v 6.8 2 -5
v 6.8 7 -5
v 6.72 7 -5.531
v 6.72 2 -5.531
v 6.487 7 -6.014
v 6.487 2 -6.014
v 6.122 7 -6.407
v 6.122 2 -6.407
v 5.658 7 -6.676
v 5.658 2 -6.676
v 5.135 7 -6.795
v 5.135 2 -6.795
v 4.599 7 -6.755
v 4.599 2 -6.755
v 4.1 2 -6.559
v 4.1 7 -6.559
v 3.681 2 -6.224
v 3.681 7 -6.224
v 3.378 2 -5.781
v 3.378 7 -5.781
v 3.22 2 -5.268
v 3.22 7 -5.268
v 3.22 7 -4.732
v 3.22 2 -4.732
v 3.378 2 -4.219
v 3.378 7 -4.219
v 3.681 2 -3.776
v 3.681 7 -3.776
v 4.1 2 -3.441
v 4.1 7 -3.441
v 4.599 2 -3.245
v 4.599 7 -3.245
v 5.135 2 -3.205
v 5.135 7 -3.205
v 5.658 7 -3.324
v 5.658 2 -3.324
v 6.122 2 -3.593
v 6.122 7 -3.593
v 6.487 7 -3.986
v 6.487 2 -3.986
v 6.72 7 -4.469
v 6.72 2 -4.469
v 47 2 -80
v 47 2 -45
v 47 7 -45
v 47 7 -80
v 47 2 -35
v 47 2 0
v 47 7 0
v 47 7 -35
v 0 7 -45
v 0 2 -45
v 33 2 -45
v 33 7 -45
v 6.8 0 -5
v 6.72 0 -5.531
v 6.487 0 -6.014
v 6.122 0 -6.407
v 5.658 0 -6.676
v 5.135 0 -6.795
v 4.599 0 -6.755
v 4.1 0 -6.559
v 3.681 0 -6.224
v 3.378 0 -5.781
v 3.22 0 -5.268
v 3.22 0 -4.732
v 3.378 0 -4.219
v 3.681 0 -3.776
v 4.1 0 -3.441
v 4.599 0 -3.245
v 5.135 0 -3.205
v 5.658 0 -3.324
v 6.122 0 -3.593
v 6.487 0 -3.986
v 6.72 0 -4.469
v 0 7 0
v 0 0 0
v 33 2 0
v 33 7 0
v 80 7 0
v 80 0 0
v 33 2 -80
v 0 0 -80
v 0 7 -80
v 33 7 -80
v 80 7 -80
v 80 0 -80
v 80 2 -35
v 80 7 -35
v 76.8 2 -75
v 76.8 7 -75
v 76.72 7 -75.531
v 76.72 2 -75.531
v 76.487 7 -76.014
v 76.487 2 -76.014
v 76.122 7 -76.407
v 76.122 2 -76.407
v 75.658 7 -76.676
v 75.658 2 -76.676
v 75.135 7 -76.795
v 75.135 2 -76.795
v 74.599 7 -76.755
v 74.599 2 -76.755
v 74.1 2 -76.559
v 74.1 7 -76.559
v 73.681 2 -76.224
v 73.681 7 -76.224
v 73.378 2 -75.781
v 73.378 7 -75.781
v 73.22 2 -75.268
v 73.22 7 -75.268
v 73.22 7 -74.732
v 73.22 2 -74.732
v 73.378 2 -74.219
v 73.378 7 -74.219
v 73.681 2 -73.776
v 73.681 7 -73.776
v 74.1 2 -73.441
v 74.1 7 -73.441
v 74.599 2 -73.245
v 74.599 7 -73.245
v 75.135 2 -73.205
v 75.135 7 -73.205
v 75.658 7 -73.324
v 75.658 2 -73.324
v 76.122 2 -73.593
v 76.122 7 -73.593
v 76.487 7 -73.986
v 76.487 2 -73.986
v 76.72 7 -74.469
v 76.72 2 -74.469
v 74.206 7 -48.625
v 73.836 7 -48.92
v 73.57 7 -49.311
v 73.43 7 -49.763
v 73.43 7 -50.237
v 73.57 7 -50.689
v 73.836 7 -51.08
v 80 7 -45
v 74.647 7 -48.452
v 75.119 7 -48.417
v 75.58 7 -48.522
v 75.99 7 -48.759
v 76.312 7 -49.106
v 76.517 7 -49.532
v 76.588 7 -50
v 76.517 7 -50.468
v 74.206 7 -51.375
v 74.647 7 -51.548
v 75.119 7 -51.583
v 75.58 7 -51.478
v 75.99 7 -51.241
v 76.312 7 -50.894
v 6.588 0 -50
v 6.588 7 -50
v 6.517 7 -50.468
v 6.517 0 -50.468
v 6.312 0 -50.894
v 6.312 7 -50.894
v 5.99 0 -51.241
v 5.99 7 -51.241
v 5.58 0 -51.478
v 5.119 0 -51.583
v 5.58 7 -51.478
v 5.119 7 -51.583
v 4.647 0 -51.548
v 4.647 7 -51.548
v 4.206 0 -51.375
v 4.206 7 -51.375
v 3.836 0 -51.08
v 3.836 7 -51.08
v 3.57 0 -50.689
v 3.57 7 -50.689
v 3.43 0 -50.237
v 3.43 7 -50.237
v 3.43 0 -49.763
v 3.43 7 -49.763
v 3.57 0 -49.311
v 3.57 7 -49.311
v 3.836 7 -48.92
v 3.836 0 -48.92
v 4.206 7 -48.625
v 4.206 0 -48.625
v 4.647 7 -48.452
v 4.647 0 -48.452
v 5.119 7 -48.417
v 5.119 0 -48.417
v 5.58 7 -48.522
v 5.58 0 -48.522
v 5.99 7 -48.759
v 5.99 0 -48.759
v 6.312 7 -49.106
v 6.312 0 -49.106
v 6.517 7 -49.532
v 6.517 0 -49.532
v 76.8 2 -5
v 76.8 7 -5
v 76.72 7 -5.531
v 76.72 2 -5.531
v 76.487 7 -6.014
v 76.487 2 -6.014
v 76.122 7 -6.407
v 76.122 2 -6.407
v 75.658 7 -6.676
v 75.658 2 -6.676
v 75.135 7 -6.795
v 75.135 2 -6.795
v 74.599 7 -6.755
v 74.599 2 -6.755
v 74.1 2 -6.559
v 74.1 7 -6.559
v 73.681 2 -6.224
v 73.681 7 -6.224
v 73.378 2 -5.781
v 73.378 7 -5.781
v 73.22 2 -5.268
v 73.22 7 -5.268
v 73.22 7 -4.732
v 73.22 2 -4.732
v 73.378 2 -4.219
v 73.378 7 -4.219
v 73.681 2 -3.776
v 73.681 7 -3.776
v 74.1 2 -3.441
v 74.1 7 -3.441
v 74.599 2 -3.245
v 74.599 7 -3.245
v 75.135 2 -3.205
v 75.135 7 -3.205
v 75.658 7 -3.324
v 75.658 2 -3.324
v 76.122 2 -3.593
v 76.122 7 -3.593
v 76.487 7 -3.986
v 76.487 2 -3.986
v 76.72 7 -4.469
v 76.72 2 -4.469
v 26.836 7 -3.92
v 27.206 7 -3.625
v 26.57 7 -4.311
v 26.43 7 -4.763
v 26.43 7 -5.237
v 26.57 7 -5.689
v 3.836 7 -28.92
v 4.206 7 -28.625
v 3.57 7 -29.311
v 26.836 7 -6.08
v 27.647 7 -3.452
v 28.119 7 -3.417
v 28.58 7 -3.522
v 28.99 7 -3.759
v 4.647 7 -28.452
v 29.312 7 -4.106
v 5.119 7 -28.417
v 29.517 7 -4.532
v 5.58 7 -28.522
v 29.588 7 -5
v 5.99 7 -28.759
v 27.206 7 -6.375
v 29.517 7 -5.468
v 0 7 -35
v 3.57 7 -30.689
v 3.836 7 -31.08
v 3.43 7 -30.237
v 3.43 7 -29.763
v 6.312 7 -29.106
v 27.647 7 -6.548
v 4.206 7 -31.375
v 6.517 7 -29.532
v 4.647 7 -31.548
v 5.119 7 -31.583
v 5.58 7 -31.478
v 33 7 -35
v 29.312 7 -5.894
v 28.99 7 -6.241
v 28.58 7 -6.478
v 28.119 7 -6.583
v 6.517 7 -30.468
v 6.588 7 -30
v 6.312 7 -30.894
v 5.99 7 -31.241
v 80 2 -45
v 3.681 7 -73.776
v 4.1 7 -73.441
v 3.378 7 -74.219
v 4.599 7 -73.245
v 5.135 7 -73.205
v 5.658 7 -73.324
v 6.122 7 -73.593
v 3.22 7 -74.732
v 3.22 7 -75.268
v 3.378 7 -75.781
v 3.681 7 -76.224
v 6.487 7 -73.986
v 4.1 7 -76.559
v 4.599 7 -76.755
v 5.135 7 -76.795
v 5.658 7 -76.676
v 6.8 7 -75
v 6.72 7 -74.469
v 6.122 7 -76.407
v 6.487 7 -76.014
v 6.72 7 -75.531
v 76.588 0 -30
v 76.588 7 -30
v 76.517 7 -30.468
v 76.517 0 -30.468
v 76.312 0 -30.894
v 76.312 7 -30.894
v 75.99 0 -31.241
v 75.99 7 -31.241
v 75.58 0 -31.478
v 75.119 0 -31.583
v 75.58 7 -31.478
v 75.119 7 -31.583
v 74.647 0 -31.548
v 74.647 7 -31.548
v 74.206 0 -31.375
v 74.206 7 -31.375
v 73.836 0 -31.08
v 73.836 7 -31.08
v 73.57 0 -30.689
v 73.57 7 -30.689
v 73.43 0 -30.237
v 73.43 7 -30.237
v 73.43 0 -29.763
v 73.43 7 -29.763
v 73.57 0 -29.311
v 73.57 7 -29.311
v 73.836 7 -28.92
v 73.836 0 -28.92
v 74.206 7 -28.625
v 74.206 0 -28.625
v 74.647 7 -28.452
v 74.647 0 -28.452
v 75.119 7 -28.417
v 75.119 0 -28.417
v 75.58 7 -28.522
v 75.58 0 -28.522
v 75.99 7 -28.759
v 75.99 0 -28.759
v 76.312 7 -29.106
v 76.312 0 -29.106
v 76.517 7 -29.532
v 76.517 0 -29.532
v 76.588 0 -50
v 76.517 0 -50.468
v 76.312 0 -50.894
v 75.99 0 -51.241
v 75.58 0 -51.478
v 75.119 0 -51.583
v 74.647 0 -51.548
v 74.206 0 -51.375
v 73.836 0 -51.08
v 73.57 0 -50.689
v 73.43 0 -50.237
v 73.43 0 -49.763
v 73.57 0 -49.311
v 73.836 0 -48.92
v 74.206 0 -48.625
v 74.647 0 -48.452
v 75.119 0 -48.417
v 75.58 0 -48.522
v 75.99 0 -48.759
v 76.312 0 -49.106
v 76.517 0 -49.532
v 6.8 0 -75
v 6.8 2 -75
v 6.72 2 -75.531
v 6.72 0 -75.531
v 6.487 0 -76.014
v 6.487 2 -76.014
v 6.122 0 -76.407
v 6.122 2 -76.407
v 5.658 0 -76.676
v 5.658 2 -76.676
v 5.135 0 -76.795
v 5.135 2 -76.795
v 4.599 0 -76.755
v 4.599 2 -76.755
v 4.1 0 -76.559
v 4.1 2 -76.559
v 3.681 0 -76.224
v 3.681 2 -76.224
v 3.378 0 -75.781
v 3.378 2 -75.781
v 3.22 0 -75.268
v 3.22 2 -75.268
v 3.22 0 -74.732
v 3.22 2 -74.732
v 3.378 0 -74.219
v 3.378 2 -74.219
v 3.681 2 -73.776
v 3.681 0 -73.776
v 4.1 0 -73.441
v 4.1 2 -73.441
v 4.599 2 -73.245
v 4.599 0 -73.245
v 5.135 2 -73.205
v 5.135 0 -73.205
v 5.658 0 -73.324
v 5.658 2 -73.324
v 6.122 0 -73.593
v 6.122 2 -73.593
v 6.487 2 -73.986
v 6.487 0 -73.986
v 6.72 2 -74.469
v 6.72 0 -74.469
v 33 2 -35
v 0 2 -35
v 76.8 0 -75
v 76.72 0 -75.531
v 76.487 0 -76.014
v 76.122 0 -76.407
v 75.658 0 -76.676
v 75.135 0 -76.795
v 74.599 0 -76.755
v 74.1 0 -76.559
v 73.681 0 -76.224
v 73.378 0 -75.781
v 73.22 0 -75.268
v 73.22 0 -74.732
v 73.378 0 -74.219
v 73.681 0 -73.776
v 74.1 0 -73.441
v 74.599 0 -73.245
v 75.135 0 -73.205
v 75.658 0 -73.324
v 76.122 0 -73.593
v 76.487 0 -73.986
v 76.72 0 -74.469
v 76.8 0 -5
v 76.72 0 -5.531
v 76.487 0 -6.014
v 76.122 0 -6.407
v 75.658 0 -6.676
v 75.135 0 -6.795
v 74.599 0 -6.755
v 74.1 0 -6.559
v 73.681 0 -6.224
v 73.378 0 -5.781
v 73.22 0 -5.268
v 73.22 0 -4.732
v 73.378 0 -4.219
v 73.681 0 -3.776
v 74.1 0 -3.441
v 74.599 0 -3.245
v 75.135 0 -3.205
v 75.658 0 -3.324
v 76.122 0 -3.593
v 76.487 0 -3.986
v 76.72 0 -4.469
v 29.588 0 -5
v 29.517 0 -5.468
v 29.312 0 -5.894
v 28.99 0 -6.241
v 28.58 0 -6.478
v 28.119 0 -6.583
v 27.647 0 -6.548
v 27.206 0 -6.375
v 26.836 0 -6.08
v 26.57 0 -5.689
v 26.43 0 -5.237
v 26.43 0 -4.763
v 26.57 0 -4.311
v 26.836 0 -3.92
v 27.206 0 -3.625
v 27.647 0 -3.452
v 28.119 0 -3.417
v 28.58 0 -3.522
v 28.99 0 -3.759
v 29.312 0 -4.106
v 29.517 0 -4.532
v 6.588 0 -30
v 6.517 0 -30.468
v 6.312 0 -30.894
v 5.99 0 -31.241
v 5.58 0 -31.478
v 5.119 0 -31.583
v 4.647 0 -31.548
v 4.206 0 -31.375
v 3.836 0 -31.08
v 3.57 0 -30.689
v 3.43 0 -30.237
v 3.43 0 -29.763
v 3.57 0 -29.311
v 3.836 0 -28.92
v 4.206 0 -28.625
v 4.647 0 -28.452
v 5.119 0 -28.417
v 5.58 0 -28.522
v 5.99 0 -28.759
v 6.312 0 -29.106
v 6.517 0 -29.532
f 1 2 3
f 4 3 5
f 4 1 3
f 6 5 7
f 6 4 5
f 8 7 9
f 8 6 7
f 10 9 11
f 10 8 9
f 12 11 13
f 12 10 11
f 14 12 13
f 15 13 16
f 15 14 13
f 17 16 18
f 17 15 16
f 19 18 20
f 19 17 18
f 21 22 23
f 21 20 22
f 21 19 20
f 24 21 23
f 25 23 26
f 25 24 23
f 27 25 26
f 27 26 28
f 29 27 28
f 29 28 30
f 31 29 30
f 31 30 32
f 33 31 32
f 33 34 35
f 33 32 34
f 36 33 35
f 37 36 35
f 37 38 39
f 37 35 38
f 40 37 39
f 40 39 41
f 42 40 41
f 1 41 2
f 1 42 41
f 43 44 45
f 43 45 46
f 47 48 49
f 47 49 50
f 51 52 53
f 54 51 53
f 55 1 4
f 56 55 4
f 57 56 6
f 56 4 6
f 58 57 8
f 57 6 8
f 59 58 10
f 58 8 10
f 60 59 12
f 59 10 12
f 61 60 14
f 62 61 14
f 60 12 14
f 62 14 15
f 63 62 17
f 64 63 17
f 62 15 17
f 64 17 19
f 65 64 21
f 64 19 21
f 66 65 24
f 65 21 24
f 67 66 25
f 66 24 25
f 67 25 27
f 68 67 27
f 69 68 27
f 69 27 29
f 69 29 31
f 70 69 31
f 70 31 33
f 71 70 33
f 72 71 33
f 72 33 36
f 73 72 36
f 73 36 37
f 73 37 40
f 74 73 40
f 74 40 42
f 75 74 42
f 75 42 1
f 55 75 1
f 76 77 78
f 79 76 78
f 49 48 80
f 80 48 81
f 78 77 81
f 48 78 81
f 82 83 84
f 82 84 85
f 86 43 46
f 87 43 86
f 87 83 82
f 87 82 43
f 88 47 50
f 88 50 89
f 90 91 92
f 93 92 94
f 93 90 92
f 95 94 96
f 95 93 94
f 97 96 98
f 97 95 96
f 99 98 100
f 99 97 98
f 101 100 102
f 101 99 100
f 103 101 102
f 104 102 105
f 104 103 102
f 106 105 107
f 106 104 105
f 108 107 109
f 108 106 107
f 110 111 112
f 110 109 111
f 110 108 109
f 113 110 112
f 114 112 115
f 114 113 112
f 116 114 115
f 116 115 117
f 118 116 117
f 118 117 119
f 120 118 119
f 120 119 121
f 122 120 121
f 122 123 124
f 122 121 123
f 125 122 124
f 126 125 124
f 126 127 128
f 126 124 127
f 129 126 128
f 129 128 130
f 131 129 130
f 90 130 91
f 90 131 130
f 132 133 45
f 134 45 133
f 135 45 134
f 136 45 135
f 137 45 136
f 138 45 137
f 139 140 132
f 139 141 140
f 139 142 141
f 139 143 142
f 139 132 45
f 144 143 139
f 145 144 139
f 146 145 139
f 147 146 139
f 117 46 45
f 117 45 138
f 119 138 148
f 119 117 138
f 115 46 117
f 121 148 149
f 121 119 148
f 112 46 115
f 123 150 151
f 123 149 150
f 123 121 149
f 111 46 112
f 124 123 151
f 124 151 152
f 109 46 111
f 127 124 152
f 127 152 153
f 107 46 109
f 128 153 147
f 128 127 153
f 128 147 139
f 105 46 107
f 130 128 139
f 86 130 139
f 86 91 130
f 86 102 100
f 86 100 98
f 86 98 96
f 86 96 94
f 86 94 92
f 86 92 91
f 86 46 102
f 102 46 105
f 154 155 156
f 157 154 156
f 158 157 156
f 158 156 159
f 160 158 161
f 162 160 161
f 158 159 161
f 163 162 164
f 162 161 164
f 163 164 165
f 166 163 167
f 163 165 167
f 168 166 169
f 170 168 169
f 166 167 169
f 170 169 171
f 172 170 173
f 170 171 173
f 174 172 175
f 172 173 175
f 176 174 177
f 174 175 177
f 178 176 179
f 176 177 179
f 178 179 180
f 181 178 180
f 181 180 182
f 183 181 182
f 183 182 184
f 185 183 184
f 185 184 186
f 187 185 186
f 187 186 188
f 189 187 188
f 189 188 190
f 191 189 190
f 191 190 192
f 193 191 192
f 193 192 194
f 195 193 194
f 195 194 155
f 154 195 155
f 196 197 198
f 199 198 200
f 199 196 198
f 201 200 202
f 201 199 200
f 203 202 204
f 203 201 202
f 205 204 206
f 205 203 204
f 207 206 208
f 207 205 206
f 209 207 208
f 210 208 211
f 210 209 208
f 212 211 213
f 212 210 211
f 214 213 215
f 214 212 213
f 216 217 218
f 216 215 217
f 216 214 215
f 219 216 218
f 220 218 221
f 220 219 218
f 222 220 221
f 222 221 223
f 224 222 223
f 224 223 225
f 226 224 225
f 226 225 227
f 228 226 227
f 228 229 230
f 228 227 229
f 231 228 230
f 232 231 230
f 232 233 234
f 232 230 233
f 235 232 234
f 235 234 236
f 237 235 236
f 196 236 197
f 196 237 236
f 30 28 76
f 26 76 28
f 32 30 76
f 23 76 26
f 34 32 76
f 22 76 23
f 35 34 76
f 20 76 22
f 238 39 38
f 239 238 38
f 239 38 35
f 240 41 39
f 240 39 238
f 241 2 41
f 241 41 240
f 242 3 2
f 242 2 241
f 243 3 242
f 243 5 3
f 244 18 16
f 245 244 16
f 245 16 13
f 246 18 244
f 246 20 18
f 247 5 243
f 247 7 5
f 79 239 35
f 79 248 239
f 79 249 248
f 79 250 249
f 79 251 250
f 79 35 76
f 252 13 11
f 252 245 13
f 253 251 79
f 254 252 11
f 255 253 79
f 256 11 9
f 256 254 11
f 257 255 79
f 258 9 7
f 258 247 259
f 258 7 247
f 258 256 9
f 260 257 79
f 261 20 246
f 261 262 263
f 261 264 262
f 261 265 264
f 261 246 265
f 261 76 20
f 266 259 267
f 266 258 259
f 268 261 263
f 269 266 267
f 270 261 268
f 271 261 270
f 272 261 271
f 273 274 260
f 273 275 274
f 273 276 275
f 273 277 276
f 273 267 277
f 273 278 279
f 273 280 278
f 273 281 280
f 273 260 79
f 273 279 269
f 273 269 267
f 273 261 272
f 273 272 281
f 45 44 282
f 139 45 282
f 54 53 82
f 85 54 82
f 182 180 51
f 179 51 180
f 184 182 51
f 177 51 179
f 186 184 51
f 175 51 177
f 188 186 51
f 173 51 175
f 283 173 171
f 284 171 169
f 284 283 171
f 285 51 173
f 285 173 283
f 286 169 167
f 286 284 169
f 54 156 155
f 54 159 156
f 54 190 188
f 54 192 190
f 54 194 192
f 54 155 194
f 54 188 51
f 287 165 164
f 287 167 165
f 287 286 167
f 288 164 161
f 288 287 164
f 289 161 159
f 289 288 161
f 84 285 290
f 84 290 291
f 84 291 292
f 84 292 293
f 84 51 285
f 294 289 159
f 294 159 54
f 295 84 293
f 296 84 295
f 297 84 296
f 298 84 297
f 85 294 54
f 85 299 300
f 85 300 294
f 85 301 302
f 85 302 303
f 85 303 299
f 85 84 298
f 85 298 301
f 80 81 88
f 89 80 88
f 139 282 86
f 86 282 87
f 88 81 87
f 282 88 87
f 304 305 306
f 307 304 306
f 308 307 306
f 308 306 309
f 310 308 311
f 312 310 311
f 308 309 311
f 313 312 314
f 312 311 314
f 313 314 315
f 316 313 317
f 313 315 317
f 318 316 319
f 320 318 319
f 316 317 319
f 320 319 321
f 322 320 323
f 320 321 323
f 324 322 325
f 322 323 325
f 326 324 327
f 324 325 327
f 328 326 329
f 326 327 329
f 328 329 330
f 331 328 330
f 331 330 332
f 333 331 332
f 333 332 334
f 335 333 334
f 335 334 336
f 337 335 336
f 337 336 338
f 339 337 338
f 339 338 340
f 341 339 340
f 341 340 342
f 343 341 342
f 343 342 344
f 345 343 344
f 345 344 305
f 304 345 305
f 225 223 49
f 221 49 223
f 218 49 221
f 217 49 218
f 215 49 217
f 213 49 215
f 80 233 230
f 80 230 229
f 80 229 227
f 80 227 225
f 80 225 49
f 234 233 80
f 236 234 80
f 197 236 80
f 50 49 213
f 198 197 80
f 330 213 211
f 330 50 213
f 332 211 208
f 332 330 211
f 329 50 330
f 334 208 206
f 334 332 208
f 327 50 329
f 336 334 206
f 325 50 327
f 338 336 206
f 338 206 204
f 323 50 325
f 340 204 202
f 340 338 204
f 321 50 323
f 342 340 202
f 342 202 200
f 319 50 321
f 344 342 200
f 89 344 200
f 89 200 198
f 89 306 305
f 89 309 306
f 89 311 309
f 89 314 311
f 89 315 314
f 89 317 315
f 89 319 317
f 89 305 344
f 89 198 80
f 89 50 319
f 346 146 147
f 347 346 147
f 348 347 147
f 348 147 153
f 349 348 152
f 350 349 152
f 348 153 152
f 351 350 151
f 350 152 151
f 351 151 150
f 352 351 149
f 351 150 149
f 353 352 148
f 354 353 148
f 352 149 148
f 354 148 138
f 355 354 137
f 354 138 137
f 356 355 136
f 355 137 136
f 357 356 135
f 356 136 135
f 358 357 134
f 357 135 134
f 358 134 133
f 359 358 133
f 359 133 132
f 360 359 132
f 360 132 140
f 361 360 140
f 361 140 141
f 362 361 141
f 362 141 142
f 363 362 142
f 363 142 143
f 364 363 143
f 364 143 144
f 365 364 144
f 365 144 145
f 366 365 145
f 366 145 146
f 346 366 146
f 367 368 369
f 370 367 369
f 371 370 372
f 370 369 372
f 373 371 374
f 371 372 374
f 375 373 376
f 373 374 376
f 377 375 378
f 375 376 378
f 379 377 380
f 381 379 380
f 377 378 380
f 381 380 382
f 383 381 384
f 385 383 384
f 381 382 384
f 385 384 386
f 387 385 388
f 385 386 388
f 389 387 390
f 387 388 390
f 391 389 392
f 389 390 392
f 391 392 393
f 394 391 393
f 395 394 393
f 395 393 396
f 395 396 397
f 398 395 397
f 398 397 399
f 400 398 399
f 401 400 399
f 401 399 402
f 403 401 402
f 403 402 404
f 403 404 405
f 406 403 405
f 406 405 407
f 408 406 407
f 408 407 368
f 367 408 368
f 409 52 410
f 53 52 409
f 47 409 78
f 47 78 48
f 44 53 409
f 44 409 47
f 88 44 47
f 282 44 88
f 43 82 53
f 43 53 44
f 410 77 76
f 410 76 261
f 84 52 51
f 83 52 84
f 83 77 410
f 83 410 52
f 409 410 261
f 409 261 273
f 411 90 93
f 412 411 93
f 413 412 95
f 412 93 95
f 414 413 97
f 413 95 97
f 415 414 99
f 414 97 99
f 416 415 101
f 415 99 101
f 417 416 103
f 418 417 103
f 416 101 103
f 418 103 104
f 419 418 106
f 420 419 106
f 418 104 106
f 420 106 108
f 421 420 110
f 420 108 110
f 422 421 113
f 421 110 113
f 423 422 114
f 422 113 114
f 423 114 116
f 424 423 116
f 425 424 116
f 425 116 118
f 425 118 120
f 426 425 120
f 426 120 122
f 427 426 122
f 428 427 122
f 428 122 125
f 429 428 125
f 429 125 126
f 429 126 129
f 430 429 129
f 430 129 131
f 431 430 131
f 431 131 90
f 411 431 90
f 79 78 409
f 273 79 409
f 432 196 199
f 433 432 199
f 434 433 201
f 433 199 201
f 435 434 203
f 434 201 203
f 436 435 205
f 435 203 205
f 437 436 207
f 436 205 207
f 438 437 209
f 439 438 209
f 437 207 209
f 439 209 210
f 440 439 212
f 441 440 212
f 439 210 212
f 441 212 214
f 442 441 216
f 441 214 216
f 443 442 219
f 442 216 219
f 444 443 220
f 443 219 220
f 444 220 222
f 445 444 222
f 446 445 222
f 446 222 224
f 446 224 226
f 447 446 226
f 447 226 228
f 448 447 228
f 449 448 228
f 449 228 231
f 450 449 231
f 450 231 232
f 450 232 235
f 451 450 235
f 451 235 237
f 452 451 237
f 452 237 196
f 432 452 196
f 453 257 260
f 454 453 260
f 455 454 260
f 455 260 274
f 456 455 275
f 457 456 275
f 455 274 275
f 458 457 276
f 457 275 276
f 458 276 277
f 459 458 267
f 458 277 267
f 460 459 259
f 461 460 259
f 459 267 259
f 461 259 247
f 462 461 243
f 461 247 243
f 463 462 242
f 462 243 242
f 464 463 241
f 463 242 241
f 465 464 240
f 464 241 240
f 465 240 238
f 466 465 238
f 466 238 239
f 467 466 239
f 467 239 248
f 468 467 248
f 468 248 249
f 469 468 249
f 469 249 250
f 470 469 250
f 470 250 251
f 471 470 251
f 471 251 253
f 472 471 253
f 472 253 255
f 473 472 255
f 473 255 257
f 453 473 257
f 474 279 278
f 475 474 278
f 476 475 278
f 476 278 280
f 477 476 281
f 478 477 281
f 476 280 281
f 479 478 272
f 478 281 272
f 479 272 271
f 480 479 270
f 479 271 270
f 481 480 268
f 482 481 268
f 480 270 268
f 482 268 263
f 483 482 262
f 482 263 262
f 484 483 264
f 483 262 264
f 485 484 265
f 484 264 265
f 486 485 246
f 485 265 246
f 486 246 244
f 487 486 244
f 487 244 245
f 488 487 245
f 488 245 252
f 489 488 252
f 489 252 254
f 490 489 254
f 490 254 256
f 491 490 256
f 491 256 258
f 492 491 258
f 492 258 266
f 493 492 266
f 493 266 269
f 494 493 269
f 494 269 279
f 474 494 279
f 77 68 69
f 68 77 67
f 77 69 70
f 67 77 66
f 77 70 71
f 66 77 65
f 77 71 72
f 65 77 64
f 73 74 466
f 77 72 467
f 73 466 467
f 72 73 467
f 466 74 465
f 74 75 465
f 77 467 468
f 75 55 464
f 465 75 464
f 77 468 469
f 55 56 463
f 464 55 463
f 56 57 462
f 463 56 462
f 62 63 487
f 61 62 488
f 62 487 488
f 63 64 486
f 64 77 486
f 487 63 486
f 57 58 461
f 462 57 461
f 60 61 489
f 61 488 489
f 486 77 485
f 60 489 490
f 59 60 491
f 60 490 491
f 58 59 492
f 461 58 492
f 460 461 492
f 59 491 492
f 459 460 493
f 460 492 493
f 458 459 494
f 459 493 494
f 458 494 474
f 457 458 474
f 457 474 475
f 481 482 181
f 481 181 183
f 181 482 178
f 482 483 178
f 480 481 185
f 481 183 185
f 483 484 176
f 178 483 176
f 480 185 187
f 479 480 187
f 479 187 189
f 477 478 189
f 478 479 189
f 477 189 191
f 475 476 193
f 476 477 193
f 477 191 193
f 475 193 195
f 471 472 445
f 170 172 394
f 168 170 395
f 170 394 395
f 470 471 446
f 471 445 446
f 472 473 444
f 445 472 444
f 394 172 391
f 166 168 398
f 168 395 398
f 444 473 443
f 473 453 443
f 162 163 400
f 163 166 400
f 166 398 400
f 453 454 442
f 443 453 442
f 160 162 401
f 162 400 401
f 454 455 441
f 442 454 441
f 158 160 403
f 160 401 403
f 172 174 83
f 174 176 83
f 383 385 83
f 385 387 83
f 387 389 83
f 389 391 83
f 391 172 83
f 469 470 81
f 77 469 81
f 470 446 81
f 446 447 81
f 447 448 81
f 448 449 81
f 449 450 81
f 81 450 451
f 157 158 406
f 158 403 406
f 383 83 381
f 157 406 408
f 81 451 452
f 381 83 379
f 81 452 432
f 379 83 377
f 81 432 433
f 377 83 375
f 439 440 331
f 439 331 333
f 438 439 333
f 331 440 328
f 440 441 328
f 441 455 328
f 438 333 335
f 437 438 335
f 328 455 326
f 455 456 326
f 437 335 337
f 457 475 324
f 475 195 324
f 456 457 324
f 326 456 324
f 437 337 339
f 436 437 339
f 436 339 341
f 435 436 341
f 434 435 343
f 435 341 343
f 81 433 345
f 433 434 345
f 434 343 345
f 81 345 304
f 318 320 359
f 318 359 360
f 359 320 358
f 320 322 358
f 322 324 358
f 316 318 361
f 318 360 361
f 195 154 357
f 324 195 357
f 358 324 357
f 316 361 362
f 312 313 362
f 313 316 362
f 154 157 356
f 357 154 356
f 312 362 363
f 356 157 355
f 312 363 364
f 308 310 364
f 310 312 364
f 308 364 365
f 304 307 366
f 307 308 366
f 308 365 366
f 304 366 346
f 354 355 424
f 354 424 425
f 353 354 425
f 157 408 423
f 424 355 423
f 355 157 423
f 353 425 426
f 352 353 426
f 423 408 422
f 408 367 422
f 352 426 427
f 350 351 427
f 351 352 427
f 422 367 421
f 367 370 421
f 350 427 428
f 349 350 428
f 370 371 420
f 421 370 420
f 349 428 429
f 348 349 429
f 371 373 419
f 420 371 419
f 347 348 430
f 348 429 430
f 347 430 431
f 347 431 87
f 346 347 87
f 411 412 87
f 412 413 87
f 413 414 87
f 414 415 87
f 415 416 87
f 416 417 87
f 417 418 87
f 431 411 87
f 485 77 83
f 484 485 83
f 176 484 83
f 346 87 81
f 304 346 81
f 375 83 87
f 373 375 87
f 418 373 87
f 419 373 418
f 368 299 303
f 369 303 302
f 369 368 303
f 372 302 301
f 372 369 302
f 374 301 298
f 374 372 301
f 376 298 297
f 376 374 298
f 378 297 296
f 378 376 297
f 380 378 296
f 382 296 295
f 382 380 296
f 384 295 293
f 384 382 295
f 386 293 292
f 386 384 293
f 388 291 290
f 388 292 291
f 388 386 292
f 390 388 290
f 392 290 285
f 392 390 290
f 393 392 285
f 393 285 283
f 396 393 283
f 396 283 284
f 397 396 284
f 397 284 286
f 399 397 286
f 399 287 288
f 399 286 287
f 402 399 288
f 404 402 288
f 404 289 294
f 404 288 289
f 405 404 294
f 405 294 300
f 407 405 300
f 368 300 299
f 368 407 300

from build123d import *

# Parameters (mm, degrees)
SKETCH1_W                    = 80
SKETCH1_H                    = 80
PCB_DEPTH                    = 2
SKETCH7_W                    = 33
SKETCH7_H                    = 35
LIPO_ADAFRUIT_CHARGERS_DEPTH = 5
LPATTERN2_COUNT              = 2
LPATTERN2_PITCH              = 47
LPATTERN2_COUNT_DIR2         = 2
LPATTERN2_PITCH_DIR2         = 45
SKETCH4_R                    = 1.8
ATTACHMENT_HOLES_DEPTH       = 6
ATTACHMENT_HOLES_DEPTH_BACK  = 3
SKETCH8_R                    = 1.5875
CUT_EXTRUDE1_DEPTH           = 8
LPATTERN3_COUNT              = 2
LPATTERN3_PITCH              = 70
LPATTERN3_COUNT_DIR2         = 2
LPATTERN3_PITCH_DIR2         = 20
SKETCH9_R                    = 1.5875
CUT_EXTRUDE2_DEPTH           = 8


with BuildPart() as part:
    # Sketch1 → PCB (new body)
    with BuildSketch(Plane(origin=(0, 0, 0), x_dir=(1, 0, 0), z_dir=(0, 1, 0))):
        with Locations((40, 40)):
            Rectangle(SKETCH1_W, SKETCH1_H)
    extrude(amount=PCB_DEPTH)

    # Sketch7 → LiPo Adafruit Chargers (add)
    with BuildSketch(Plane(origin=(0, 2, 0), x_dir=(1, 0, 0), z_dir=(0, 1, 0))):
        with Locations((63.5, 17.5)):
            Rectangle(SKETCH7_W, SKETCH7_H)
    lipo_adafruit_chargers = extrude(amount=LIPO_ADAFRUIT_CHARGERS_DEPTH)

    # LPattern2: LiPo Adafruit Chargers 2 × 2
    with Locations(*[(-i * LPATTERN2_PITCH, 0, -j * LPATTERN2_PITCH_DIR2) for i in range(LPATTERN2_COUNT) for j in range(LPATTERN2_COUNT_DIR2) if (i, j) != (0, 0)]):
        add(lipo_adafruit_chargers)

    # Sketch4 → Attachment holes (cut, two sides)
    with BuildSketch(Plane(origin=(0, 2, 0), x_dir=(1, 0, 0), z_dir=(0, 1, 0))) as attachment_holes_sk:
        with Locations((5, 75)):
            Circle(SKETCH4_R)
        with Locations((75, 75)):
            Circle(SKETCH4_R)
        with Locations((75, 5)):
            Circle(SKETCH4_R)
        with Locations((5, 5)):
            Circle(SKETCH4_R)
    extrude(amount=ATTACHMENT_HOLES_DEPTH, mode=Mode.SUBTRACT)
    extrude(attachment_holes_sk.sketch, amount=-ATTACHMENT_HOLES_DEPTH_BACK, mode=Mode.SUBTRACT)

    # Sketch8 → Cut-Extrude1 (cut, through all)
    with BuildSketch(Plane(origin=(0, 7, 0), x_dir=(1, 0, 0), z_dir=(0, 1, 0))):
        with Locations((5, 30)):
            Circle(SKETCH8_R)
    cut_extrude1 = extrude(amount=-CUT_EXTRUDE1_DEPTH, mode=Mode.SUBTRACT)

    # LPattern3: Cut-Extrude1 2 × 2
    with Locations(*[(i * LPATTERN3_PITCH, 0, -j * LPATTERN3_PITCH_DIR2) for i in range(LPATTERN3_COUNT) for j in range(LPATTERN3_COUNT_DIR2) if (i, j) != (0, 0)]):
        add(cut_extrude1, mode=Mode.SUBTRACT)

    # Sketch9 → Cut-Extrude2 (cut, through all)
    with BuildSketch(Plane(origin=(0, 7, 0), x_dir=(1, 0, 0), z_dir=(0, 1, 0))):
        with Locations((28, 5)):
            Circle(SKETCH9_R)
    extrude(amount=-CUT_EXTRUDE2_DEPTH, mode=Mode.SUBTRACT)


solid = part.part
